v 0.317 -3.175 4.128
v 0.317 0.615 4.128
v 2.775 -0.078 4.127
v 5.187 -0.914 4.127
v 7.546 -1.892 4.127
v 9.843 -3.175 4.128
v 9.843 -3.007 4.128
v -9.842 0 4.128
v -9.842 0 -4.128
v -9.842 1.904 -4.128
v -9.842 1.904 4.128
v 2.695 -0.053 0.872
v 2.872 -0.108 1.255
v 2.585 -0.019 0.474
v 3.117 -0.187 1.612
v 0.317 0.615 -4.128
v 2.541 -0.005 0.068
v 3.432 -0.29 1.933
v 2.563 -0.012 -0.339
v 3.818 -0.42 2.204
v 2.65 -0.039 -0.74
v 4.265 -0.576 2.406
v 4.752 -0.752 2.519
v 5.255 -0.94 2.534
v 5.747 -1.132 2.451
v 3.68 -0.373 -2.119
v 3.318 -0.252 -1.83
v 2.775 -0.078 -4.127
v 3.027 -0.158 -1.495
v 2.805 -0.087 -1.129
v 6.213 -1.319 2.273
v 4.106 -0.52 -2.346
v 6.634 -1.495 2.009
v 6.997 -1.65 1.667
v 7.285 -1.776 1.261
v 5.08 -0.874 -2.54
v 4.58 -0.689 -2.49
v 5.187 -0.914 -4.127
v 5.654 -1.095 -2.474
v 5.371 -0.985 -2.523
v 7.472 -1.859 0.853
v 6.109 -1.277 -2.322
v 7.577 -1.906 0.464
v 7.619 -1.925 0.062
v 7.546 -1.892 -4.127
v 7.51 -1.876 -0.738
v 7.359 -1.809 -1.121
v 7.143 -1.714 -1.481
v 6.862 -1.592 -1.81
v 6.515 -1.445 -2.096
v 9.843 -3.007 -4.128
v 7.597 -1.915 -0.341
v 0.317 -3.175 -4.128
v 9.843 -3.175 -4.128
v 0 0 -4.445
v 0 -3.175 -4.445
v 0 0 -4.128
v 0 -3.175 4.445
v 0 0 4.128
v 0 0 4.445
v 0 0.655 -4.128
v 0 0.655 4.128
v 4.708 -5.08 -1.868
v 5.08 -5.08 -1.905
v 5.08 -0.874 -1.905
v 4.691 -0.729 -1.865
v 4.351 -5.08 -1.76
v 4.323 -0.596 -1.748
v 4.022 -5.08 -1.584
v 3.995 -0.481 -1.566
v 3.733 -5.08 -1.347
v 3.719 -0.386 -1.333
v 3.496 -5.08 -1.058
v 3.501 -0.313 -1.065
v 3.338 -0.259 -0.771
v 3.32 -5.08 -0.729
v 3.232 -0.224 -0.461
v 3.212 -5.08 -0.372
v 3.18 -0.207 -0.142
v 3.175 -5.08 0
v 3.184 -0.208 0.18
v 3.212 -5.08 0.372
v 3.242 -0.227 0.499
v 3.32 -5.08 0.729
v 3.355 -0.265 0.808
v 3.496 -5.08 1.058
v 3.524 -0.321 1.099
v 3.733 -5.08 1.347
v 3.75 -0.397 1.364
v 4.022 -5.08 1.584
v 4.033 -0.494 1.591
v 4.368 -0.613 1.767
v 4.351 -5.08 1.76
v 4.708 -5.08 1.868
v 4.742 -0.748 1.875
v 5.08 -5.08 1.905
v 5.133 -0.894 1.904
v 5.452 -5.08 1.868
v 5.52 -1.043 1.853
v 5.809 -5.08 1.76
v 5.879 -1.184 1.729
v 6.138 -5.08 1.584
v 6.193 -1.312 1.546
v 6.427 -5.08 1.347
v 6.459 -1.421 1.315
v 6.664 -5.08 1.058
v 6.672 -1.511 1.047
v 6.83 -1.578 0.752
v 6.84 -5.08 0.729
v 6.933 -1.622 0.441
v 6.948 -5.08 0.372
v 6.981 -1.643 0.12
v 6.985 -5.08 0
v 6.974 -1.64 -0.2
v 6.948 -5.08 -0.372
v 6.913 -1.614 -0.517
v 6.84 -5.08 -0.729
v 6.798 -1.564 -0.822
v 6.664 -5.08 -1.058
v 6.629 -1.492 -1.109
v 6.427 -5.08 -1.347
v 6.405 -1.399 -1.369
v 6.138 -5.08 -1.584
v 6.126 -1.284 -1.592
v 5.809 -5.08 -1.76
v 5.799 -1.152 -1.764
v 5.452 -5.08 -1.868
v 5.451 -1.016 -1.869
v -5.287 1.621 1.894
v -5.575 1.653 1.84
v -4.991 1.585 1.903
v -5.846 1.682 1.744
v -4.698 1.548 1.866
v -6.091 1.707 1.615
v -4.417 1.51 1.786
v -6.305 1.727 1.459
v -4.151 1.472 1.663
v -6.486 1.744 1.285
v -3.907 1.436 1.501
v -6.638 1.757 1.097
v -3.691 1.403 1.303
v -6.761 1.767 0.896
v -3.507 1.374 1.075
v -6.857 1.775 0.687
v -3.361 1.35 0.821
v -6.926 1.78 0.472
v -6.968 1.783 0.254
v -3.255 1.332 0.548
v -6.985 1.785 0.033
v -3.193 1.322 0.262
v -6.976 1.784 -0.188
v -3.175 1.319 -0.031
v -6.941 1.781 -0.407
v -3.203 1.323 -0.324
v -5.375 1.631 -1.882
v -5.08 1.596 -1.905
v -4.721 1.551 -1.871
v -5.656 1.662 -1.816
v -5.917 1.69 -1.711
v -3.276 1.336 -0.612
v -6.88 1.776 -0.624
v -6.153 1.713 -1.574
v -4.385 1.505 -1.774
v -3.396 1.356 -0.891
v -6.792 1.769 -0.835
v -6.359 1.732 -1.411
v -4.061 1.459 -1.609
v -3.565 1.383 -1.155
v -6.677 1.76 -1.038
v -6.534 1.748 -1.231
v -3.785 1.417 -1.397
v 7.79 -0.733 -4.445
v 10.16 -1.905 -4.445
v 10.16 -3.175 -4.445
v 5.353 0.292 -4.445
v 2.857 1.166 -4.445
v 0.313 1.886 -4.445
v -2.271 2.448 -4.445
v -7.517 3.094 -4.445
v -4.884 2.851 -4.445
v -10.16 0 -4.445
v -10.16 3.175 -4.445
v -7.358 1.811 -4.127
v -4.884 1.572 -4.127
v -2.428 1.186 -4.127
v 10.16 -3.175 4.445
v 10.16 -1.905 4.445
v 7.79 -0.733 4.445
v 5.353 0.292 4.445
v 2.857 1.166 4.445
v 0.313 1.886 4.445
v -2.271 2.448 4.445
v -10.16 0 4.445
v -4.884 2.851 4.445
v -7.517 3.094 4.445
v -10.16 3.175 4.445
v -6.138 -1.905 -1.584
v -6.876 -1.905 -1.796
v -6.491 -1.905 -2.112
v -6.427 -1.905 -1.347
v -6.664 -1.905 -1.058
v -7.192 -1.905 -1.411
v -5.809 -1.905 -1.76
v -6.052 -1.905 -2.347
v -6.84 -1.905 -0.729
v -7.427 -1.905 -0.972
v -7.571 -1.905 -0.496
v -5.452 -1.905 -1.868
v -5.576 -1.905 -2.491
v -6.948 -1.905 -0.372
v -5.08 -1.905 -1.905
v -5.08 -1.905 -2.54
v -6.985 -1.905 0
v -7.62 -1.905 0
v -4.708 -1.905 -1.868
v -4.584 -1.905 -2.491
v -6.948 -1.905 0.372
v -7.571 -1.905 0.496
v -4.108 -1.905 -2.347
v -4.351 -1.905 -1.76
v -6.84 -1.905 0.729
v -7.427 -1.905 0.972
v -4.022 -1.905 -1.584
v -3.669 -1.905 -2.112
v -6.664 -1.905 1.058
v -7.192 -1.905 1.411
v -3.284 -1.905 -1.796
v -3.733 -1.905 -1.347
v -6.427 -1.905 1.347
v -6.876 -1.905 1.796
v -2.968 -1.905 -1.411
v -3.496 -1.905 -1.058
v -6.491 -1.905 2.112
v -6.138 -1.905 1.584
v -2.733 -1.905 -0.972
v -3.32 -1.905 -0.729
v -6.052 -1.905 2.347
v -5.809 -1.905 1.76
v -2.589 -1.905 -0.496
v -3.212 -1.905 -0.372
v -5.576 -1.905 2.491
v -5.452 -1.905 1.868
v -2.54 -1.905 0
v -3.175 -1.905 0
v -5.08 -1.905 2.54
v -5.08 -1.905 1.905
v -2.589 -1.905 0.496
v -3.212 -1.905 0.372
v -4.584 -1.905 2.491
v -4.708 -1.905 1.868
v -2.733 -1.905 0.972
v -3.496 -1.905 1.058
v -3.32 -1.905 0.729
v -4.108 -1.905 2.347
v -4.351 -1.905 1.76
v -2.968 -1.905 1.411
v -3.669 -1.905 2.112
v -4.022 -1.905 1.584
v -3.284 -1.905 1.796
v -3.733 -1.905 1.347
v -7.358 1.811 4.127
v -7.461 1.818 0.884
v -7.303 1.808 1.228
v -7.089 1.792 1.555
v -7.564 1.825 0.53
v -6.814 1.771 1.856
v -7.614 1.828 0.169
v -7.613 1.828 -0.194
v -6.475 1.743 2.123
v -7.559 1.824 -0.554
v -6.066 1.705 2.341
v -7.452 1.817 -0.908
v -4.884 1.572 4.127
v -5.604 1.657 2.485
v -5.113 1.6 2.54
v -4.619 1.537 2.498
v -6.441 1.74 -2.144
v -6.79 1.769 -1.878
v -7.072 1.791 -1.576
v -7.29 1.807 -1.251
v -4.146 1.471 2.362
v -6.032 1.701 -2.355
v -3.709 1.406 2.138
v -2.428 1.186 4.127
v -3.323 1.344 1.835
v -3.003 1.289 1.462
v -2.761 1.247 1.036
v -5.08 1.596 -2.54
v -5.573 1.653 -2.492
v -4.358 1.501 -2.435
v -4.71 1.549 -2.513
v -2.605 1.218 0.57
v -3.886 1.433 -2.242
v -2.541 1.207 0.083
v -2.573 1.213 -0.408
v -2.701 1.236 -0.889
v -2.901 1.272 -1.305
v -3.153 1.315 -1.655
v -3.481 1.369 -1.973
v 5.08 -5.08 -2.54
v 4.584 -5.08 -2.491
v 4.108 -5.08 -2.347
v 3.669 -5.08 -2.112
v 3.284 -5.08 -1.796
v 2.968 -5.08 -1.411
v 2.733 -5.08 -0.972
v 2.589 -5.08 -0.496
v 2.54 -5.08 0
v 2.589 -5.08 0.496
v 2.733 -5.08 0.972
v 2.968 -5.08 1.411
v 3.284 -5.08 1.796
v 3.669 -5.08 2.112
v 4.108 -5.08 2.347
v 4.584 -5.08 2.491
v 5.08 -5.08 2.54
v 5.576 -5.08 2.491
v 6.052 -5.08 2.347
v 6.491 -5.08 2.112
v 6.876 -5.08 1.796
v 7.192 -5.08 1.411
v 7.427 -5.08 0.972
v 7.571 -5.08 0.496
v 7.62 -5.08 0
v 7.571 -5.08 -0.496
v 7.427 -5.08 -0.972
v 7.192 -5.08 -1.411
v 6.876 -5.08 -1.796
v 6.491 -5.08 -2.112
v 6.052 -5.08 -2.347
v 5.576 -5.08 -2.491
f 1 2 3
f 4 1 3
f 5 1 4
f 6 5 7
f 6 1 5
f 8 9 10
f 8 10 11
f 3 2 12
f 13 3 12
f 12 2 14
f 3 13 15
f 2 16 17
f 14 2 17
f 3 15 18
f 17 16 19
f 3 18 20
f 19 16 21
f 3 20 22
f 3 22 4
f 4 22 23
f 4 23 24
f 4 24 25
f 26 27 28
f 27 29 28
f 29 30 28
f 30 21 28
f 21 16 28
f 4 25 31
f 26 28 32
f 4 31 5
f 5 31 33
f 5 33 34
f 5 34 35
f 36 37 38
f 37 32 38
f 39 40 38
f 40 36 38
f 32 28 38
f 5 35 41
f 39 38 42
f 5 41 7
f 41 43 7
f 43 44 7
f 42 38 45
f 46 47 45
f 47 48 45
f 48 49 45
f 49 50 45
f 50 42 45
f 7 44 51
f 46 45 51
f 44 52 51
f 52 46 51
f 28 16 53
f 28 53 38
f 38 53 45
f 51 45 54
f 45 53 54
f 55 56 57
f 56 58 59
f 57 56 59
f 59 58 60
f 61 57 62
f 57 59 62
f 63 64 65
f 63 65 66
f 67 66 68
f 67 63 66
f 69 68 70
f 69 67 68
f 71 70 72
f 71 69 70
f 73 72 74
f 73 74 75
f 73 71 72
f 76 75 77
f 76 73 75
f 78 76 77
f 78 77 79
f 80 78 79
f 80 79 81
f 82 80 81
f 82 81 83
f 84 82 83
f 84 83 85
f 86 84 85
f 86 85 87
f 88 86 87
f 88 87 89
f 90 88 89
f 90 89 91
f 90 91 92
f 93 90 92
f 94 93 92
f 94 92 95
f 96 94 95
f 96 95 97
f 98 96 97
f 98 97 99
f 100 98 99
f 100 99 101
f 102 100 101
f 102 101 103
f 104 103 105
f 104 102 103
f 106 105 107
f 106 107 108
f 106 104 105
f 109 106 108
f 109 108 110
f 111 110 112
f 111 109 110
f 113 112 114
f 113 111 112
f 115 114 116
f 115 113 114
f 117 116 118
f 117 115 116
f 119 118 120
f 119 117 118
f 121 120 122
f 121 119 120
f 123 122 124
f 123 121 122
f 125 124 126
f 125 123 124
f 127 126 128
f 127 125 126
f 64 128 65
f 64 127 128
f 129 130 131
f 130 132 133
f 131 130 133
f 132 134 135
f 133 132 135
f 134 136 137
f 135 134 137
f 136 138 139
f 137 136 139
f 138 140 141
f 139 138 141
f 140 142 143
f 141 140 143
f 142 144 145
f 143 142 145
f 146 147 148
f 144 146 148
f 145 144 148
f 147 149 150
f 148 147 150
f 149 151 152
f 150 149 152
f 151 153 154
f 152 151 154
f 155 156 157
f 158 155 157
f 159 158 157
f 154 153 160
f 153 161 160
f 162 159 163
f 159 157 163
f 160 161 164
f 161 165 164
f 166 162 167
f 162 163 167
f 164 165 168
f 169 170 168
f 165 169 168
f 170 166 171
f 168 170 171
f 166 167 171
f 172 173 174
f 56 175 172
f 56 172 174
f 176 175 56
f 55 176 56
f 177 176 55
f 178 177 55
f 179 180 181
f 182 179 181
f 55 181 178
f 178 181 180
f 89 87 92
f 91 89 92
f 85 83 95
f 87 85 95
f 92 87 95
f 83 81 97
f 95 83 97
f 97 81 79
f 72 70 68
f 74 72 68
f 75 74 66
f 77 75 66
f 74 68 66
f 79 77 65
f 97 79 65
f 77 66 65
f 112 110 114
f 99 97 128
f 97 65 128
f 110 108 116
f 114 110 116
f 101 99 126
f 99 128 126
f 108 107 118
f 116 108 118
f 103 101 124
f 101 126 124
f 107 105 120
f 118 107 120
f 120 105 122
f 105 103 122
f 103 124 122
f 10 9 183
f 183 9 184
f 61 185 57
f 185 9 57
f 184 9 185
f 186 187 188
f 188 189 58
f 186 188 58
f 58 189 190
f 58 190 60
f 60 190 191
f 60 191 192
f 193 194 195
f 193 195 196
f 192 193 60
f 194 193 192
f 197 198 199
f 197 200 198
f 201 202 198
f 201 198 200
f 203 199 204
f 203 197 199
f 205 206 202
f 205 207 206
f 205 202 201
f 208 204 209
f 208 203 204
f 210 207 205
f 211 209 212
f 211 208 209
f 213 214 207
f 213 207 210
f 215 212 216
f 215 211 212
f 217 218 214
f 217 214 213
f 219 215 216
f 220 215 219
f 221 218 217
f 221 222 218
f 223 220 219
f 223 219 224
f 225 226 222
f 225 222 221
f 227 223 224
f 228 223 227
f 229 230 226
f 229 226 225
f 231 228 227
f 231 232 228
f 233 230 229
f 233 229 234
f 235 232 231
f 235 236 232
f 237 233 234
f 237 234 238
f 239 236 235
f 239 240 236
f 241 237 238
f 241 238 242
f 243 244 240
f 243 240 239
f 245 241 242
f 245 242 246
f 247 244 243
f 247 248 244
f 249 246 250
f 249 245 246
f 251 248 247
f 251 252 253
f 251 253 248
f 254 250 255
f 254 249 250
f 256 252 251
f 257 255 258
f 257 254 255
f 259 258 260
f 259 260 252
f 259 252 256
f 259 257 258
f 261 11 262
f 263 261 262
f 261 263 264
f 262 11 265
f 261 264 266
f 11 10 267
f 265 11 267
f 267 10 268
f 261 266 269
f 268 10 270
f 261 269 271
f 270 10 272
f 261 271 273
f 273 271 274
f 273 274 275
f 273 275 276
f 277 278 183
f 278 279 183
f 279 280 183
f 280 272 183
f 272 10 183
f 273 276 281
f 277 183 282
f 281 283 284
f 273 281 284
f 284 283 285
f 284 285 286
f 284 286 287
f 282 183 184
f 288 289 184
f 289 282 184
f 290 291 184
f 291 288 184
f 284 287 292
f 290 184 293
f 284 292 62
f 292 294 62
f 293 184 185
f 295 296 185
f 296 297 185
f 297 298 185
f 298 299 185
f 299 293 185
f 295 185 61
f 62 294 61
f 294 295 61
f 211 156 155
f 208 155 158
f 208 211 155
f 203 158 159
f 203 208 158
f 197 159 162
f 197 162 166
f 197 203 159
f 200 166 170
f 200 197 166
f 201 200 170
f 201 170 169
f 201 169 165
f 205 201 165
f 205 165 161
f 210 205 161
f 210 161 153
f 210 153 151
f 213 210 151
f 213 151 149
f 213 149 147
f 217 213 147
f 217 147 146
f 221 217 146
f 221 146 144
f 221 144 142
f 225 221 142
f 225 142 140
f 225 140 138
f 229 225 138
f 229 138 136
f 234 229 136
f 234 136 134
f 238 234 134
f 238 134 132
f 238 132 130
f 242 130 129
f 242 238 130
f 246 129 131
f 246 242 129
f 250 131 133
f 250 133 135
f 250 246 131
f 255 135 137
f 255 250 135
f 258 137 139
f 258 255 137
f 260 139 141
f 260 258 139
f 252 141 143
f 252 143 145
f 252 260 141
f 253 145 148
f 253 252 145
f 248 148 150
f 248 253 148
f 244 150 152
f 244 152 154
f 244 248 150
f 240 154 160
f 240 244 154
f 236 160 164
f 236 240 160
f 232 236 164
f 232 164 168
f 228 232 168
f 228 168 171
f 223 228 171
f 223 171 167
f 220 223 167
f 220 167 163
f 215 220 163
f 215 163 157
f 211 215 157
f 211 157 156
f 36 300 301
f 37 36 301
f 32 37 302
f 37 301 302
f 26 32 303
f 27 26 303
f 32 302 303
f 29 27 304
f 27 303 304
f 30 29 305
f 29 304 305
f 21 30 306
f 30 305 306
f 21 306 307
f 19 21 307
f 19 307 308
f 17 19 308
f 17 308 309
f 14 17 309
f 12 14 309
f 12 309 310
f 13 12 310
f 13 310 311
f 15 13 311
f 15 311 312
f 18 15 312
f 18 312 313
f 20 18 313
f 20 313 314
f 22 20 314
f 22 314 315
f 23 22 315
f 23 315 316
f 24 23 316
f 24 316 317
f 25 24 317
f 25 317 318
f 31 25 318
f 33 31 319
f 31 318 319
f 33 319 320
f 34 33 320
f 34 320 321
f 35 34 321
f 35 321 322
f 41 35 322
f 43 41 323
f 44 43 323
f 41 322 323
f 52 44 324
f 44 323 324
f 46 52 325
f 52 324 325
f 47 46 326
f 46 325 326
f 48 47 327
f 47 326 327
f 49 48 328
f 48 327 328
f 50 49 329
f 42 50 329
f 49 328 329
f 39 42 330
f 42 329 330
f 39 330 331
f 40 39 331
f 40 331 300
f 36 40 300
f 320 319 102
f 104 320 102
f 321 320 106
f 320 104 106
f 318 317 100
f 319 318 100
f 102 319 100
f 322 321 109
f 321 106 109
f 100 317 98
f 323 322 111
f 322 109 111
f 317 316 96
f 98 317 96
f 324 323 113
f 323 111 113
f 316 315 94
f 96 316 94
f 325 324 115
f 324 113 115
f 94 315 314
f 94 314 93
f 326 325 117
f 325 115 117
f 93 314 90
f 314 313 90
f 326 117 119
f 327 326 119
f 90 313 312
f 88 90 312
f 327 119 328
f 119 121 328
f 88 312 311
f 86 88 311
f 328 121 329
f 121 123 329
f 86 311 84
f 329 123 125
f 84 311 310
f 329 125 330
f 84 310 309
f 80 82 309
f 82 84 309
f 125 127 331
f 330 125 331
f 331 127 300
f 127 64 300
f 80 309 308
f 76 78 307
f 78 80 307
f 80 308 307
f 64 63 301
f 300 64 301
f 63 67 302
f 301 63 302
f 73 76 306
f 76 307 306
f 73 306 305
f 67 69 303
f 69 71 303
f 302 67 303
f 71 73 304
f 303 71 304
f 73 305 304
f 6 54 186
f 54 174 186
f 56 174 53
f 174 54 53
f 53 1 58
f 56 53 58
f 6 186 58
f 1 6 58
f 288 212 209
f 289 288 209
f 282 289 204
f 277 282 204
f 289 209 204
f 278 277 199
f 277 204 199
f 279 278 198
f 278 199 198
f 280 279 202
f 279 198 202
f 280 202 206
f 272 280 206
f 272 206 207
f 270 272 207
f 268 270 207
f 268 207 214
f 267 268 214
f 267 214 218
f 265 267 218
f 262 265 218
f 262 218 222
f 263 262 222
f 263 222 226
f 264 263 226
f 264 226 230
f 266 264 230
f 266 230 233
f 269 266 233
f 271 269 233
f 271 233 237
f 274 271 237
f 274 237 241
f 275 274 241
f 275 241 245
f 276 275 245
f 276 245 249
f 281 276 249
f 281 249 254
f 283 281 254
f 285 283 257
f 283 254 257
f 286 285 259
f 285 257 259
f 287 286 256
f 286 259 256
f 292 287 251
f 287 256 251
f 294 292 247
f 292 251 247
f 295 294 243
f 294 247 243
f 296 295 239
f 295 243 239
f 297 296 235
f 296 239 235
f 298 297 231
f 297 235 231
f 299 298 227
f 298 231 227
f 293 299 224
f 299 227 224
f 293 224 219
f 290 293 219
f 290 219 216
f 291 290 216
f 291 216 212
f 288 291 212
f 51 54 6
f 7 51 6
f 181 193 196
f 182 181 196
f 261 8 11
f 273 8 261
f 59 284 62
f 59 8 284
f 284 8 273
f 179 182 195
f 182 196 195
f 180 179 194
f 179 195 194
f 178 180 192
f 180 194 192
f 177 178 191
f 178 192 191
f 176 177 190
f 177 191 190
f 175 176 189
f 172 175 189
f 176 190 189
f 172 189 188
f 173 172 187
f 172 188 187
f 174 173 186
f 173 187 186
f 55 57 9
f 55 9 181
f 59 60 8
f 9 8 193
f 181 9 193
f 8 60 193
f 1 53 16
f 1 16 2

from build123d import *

# Parameters (mm, degrees)
BOSS_EXTRUDE1_DEPTH     = 4.445
CUT_EXTRUDE1_REACH      = 13.535
CUT_EXTRUDE1_END_RADIUS = 41.91
SKETCH2_W               = 9.8425
SKETCH2_H               = 8.255
CUT_EXTRUDE3_REACH      = 14.779
CUT_EXTRUDE3_END_RADIUS = 43.18
SKETCH3_W               = 9.525
SKETCH3_H               = 8.255
BOSS_EXTRUDE2_REACH     = 15.825
SKETCH4_R               = 2.54
SKETCH4_R_2             = 1.905
SKETCH5_W               = 6.203096786
SKETCH5_H               = 3.175
CUT_EXTRUDE4_DEPTH      = 13.197951714
CUT_EXTRUDE4_DEPTH_BACK = 13.197951714


with BuildPart() as part:
    # Sketch1 → Boss-Extrude1 (new, symmetric)
    with BuildSketch(Plane.XY):
        with BuildLine():
            Line((-10.16, 0), (-10.16, 3.175))
            ThreePointArc((-10.16, 3.175), (0.312688289, 1.885753156), (10.16, -1.905))
            Line((10.16, -1.905), (10.16, -3.175))
            Line((10.16, -3.175), (0, -3.175))
            Line((0, -3.175), (0, 0))
            Line((0, 0), (-10.16, 0))
        make_face()
    extrude(amount=BOSS_EXTRUDE1_DEPTH, both=True)

    # Cut-Extrude1: up to this cylinder (the profile starts inside it)
    cut_extrude1_end = Plane(origin=(-10.16, -40.005, 0), z_dir=(0, 0, -1)) * Cylinder(CUT_EXTRUDE1_END_RADIUS, 111.89, mode=Mode.PRIVATE)
    # Sketch2 → Cut-Extrude1 (cut, up to the surface)
    with BuildSketch(Plane.XZ, mode=Mode.PRIVATE) as cut_extrude1_sk1:
        with Locations((-4.92125, 0)):
            Rectangle(SKETCH2_W, SKETCH2_H)
    cut_extrude1_tool1 = extrude(cut_extrude1_sk1.sketch, amount=-CUT_EXTRUDE1_REACH, mode=Mode.PRIVATE) & cut_extrude1_end
    add(cut_extrude1_tool1.solids().sort_by_distance((-4.92125, 0, 0))[0], mode=Mode.SUBTRACT)

    # Cut-Extrude3: up to this cylinder (the profile starts inside it)
    cut_extrude3_end = Plane(origin=(-10.16, -41.275, 0), z_dir=(0, 0, -1)) * Cylinder(CUT_EXTRUDE3_END_RADIUS, 116.918, mode=Mode.PRIVATE)
    # Sketch3 → Cut-Extrude3 (cut, up to the surface)
    with BuildSketch(Plane.XZ.offset(3.175), mode=Mode.PRIVATE) as cut_extrude3_sk1:
        with Locations((5.08, 0)):
            Rectangle(SKETCH3_W, SKETCH3_H)
    cut_extrude3_tool1 = extrude(cut_extrude3_sk1.sketch, amount=-CUT_EXTRUDE3_REACH, mode=Mode.PRIVATE) & cut_extrude3_end
    add(cut_extrude3_tool1.solids().sort_by_distance((5.08, -3.175, 0))[0], mode=Mode.SUBTRACT)

    # Sketch4 → Boss-Extrude2 (add, up to next)
    with BuildSketch(Plane(origin=(0, -5.08, 0), x_dir=(1, 0, 0), z_dir=(0, 1, 0)), mode=Mode.PRIVATE) as boss_extrude2_sk1:
        with Locations(Location((-5.08, 0, 0), (0, 0, 90))):
            Circle(SKETCH4_R)
        with Locations(Location((-5.08, 0, 0), (0, 0, 90))):
            Circle(SKETCH4_R_2, mode=Mode.SUBTRACT)
    boss_extrude2_tool1 = extrude(boss_extrude2_sk1.sketch, amount=BOSS_EXTRUDE2_REACH, mode=Mode.PRIVATE) - part.part
    # Sketch4 → Boss-Extrude2 (add, up to next)
    with BuildSketch(Plane(origin=(0, -5.08, 0), x_dir=(1, 0, 0), z_dir=(0, 1, 0)), mode=Mode.PRIVATE) as boss_extrude2_sk2:
        with Locations(Location((5.08, 0, 0), (0, 0, 90))):
            Circle(SKETCH4_R)
        with Locations(Location((5.08, 0, 0), (0, 0, 90))):
            Circle(SKETCH4_R_2, mode=Mode.SUBTRACT)
    boss_extrude2_tool2 = extrude(boss_extrude2_sk2.sketch, amount=BOSS_EXTRUDE2_REACH, mode=Mode.PRIVATE) - part.part
    add(boss_extrude2_tool1.solids().sort_by_distance((-5.08, -5.08, 2.468158))[0])
    add(boss_extrude2_tool2.solids().sort_by_distance((5.08, -5.08, 2.468158))[0])

    # Sketch5 → Cut-Extrude4 (cut, two sides)
    with BuildSketch(Plane.XY) as cut_extrude4_sk:
        with Locations((-4.842768544, -3.4925)):
            Rectangle(SKETCH5_W, SKETCH5_H)
    extrude(amount=CUT_EXTRUDE4_DEPTH, mode=Mode.SUBTRACT)
    extrude(cut_extrude4_sk.sketch, amount=-CUT_EXTRUDE4_DEPTH_BACK, mode=Mode.SUBTRACT)


solid = part.part
